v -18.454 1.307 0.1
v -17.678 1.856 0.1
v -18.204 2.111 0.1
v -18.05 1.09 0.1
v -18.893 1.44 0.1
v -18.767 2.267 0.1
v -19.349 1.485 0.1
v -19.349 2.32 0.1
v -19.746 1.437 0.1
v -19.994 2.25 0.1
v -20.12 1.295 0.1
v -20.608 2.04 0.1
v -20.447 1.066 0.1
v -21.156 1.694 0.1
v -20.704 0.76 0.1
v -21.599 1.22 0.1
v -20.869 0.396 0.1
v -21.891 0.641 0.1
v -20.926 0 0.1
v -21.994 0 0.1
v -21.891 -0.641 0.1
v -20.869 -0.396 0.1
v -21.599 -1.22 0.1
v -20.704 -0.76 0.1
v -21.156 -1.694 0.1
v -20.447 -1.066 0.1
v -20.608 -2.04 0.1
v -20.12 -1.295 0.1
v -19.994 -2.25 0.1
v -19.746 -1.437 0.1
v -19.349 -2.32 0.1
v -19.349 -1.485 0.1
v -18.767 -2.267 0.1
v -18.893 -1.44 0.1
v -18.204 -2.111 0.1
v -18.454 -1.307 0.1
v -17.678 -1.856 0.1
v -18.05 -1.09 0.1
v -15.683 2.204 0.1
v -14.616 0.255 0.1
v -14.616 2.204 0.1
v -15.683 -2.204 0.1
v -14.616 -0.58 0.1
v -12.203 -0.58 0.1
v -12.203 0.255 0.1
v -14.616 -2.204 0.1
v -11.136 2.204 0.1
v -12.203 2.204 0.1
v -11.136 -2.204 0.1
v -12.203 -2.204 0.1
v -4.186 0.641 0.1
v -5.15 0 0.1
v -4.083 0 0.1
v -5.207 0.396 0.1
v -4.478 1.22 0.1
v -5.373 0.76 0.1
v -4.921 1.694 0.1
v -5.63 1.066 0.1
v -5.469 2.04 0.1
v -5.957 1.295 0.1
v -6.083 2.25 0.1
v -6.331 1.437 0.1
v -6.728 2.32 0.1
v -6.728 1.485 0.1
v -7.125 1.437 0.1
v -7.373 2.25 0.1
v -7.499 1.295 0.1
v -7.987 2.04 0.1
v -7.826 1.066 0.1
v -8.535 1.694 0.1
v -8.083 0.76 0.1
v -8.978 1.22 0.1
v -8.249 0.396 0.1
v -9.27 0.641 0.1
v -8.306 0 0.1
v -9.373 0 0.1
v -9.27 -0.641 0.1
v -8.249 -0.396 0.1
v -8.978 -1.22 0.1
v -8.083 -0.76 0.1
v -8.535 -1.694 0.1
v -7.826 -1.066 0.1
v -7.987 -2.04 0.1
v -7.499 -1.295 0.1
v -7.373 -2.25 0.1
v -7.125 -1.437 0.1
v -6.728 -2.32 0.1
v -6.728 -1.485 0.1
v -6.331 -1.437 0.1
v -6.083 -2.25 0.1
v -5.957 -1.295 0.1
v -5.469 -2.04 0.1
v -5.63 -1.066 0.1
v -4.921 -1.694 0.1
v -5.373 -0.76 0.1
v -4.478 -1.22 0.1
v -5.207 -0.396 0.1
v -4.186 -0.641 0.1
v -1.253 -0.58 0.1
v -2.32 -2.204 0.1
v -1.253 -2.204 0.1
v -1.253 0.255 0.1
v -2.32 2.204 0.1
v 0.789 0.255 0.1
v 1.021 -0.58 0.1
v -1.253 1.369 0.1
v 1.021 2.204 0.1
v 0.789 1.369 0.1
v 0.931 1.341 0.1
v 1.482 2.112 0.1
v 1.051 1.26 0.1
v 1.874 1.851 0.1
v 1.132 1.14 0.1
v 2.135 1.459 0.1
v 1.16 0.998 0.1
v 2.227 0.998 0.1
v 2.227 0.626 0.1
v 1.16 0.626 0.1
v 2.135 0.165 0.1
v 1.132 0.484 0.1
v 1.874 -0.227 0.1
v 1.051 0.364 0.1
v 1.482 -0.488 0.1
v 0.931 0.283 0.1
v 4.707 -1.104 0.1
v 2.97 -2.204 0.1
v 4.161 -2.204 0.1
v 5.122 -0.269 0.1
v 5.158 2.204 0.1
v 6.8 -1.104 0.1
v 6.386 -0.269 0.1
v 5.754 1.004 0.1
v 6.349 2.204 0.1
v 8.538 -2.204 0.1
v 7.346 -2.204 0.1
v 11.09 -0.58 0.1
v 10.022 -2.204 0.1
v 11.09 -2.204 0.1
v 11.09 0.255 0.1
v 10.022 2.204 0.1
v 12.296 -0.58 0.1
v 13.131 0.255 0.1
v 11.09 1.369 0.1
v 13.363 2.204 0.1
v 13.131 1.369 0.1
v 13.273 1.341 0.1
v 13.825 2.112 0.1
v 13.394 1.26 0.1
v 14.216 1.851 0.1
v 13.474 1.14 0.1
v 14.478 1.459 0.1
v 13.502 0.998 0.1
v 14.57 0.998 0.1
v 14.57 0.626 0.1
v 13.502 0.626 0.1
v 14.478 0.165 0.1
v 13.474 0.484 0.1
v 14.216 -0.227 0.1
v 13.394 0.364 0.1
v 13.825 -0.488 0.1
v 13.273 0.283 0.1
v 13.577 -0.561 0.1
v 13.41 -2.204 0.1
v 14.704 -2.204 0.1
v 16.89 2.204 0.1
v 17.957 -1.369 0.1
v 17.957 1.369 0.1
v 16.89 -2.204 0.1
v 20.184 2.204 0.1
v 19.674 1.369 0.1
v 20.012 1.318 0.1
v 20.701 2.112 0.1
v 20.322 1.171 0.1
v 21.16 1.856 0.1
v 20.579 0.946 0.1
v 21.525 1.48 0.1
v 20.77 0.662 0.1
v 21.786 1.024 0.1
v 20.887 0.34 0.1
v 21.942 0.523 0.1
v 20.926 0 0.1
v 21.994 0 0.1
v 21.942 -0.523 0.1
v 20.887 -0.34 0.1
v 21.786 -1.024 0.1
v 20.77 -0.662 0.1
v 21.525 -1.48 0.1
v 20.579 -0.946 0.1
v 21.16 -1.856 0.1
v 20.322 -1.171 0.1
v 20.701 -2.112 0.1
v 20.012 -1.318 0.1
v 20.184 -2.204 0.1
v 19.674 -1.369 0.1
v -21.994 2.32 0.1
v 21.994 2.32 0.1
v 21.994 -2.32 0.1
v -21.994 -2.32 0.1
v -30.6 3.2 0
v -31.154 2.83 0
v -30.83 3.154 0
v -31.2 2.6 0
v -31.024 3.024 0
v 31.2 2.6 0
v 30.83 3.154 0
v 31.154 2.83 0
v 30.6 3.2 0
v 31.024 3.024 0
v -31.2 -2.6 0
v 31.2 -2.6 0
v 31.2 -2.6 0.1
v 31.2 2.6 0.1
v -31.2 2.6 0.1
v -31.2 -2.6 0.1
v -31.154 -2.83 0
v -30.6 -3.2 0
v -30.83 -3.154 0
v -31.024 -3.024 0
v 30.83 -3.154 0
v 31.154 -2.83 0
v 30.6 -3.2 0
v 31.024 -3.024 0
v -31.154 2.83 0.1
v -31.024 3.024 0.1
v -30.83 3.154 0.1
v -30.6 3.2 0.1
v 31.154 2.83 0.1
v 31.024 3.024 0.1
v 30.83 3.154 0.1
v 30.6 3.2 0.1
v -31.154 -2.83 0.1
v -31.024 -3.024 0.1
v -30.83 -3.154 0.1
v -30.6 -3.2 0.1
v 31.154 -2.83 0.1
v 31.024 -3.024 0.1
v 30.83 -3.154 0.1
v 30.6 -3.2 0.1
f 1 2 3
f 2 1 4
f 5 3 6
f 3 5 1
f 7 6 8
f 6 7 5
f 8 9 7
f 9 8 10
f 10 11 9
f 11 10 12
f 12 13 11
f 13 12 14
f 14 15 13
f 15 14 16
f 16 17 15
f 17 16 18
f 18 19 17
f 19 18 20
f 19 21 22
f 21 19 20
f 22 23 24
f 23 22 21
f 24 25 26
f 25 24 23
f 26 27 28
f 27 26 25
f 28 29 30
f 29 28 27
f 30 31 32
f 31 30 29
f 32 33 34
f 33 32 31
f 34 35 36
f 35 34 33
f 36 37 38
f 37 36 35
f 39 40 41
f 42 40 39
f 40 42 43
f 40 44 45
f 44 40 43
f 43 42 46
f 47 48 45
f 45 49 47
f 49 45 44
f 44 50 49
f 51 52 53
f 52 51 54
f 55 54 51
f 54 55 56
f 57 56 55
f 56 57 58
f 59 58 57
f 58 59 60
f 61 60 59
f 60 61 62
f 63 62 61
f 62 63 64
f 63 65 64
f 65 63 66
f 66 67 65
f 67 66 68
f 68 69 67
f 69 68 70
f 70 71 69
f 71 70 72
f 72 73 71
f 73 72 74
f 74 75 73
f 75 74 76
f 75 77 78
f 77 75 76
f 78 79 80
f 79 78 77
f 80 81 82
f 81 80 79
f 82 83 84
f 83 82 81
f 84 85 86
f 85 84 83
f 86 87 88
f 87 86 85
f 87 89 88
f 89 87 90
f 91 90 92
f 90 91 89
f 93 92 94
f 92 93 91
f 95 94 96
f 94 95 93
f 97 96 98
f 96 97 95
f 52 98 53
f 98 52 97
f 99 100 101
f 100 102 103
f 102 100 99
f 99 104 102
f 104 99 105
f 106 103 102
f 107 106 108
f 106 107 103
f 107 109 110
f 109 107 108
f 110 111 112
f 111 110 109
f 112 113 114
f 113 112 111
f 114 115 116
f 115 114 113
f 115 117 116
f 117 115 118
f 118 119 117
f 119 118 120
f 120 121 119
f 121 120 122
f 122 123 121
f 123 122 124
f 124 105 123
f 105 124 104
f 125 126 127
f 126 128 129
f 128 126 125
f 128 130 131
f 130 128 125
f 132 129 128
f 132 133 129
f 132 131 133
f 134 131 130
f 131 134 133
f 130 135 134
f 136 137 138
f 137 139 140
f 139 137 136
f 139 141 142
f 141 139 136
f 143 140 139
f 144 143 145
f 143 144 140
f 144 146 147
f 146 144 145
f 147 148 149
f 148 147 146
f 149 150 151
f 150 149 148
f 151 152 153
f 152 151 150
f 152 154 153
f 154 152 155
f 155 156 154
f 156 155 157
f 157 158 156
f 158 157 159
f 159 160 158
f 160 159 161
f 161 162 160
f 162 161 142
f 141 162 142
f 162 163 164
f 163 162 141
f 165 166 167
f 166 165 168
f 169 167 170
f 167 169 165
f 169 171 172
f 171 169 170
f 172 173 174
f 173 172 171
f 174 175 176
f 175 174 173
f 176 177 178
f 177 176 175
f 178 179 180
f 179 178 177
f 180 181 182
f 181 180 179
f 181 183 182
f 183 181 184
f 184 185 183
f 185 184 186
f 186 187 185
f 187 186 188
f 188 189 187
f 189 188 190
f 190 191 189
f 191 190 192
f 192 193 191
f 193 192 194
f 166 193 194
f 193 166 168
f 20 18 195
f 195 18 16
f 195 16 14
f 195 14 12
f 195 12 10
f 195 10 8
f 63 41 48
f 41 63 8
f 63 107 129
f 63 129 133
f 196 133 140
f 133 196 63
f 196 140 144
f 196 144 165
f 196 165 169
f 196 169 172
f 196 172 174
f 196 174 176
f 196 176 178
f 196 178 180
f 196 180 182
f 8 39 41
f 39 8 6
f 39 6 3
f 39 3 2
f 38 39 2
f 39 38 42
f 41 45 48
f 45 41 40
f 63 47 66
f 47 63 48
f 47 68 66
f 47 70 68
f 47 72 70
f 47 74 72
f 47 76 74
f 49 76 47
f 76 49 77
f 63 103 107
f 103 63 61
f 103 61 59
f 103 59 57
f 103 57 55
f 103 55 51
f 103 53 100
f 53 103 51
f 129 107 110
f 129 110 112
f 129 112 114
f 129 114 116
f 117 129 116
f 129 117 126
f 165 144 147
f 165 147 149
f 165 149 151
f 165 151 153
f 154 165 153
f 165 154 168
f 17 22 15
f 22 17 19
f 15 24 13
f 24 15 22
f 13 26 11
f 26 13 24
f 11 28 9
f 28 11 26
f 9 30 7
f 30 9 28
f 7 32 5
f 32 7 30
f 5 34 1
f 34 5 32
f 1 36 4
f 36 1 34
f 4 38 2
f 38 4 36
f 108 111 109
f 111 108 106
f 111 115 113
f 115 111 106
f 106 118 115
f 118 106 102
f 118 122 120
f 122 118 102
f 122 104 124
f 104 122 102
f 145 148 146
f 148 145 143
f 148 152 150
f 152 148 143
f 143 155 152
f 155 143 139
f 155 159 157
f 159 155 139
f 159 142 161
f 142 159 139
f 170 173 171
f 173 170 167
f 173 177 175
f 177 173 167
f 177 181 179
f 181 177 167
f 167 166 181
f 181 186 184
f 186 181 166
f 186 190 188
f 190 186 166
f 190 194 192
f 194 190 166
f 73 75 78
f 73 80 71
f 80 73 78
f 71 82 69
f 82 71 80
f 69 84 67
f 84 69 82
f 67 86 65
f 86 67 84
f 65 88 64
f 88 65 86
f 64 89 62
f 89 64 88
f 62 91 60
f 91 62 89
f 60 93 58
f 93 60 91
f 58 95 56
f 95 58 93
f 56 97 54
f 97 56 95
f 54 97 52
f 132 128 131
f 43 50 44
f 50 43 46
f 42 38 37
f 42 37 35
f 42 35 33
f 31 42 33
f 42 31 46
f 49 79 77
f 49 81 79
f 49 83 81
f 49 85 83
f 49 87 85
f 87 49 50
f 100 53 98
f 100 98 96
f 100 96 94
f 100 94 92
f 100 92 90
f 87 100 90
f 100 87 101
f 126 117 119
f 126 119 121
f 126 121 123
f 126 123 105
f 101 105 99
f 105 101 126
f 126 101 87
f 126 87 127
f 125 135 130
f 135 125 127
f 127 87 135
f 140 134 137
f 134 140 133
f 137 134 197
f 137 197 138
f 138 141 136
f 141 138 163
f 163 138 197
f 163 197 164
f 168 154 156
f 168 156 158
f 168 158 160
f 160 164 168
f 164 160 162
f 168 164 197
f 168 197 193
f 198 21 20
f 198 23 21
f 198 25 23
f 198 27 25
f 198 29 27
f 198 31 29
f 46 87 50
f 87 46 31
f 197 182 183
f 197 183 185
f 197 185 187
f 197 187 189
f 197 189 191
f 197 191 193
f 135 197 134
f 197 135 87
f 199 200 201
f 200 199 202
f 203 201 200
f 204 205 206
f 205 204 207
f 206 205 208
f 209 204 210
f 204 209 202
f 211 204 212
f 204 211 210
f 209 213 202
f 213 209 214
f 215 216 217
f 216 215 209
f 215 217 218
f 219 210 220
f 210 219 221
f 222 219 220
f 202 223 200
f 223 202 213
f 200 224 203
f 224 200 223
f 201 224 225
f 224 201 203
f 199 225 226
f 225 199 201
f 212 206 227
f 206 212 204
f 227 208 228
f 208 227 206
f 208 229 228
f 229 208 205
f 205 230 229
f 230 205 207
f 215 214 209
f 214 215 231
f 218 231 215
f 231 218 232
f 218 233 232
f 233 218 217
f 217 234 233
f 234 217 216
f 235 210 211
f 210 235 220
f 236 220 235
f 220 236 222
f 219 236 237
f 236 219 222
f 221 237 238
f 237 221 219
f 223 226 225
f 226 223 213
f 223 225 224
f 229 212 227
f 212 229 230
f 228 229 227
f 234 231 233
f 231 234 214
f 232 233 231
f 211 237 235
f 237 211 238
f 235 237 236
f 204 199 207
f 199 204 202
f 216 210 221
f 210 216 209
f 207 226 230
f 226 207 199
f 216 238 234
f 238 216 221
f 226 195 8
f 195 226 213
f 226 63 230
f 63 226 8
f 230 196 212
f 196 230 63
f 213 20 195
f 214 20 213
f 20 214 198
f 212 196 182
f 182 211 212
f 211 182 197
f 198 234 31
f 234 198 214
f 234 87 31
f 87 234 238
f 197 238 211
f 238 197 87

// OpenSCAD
// file: ../p/box3u12.scad
use <../lib.scad>
function ldraw_lib__box3u12() = [
// 0 Box with 3 Parallel Faces without Any Edges
// 0 Name: box3u12.dat
// 0 Author: J.C. Tchang [tchang]
// 0 !LDRAW_ORG Primitive UPDATE 2014-02
// 0 !LICENSE Licensed under CC BY 4.0 : see CAreadme.txt
// 
// 0 BFC CERTIFY CCW
  [0,"BFC","CERTIFY"],
  [0,"BFC","CCW"],
// 
// 0 !HISTORY 2014-12-23 [PTadmin] Official Update 2014-02
// 
// 
// 4 16 -1 1 1 1 1 1 1 1 -1 -1 1 -1
  [4,16,-1,1,1,1,1,1,1,1,-1,-1,1,-1],
// 4 16 -1 1 1 -1 0 1 1 0 1 1 1 1
  [4,16,-1,1,1,-1,0,1,1,0,1,1,1,1],
// 4 16 1 1 -1 1 0 -1 -1 0 -1 -1 1 -1
  [4,16,1,1,-1,1,0,-1,-1,0,-1,-1,1,-1],
];
module ldraw_lib__box3u12(step=0, col=false, unit=2/5, alt=false, line=0.2, solid=!$preview)
    makepoly(ldraw_lib__box3u12(), step=step, col=col, unit=unit, alt=alt, line=line, solid=solid);
ldraw_lib__box3u12(line=0.2);
// file: ../p/1-4cyli.scad
use <../lib.scad>
function ldraw_lib__1_4cyli() = [
// 0 Cylinder 0.25
// 0 Name: 1-4cyli.dat
// 0 Author: James Jessiman
// 0 !LDRAW_ORG Primitive UPDATE 2012-01
// 0 !LICENSE Licensed under CC BY 4.0 : see CAreadme.txt
// 
// 0 BFC CERTIFY CCW
  [0,"BFC","CERTIFY"],
  [0,"BFC","CCW"],
// 
// 0 !HISTORY 2002-03-23 [sbliss] Added BFC statement.
// 0 !HISTORY 2002-04-25 [PTadmin] Official Update 2002-02
// 0 !HISTORY 2007-06-22 [PTadmin] Header formatted for Contributor Agreement
// 0 !HISTORY 2008-07-01 [PTadmin] Official Update 2008-01
// 0 !HISTORY 2012-02-16 [Philo] Changed to CCW
// 0 !HISTORY 2012-03-30 [PTadmin] Official Update 2012-01
// 
// 
// 4 16 1 1 0 0.9239 1 0.3827 0.9239 0 0.3827 1 0 0
  [4,16,1,1,0,0.9239,1,0.3827,0.9239,0,0.3827,1,0,0],
// 5 24 1 0 0 1 1 0 0.9239 0 0.3827 1 0 -1
  [5,24,1,0,0,1,1,0,0.9239,0,0.3827,1,0,-1],
// 4 16 0.9239 1 0.3827 0.7071 1 0.7071 0.7071 0 0.7071 0.9239 0 0.3827
  [4,16,0.9239,1,0.3827,0.7071,1,0.7071,0.7071,0,0.7071,0.9239,0,0.3827],
// 5 24 0.9239 0 0.3827 0.9239 1 0.3827 0.7071 0 0.7071 1 0 0
  [5,24,0.9239,0,0.3827,0.9239,1,0.3827,0.7071,0,0.7071,1,0,0],
// 4 16 0.7071 1 0.7071 0.3827 1 0.9239 0.3827 0 0.9239 0.7071 0 0.7071
  [4,16,0.7071,1,0.7071,0.3827,1,0.9239,0.3827,0,0.9239,0.7071,0,0.7071],
// 5 24 0.7071 0 0.7071 0.7071 1 0.7071 0.3827 0 0.9239 0.9239 0 0.3827
  [5,24,0.7071,0,0.7071,0.7071,1,0.7071,0.3827,0,0.9239,0.9239,0,0.3827],
// 4 16 0.3827 1 0.9239 0 1 1 0 0 1 0.3827 0 0.9239
  [4,16,0.3827,1,0.9239,0,1,1,0,0,1,0.3827,0,0.9239],
// 5 24 0.3827 0 0.9239 0.3827 1 0.9239 0 0 1 0.7071 0 0.7071
  [5,24,0.3827,0,0.9239,0.3827,1,0.9239,0,0,1,0.7071,0,0.7071],
// 5 24 0 0 1 0 1 1 0.3827 0 0.9239 -1 0 1
  [5,24,0,0,1,0,1,1,0.3827,0,0.9239,-1,0,1],
];
module ldraw_lib__1_4cyli(step=0, col=false, unit=2/5, alt=false, line=0.2, solid=!$preview)
    makepoly(ldraw_lib__1_4cyli(), step=step, col=col, unit=unit, alt=alt, line=line, solid=solid);
ldraw_lib__1_4cyli(line=0.2);
// file: ../p/1-4chrd.scad
use <../lib.scad>
function ldraw_lib__1_4chrd() = [
// 0 Chord 0.25
// 0 Name: 1-4chrd.dat
// 0 Author: Max Martin Richter [MMR1988]
// 0 !LDRAW_ORG Primitive UPDATE 2023-05
// 0 !LICENSE Licensed under CC BY 4.0 : see CAreadme.txt
// 
// 0 BFC CERTIFY CCW
  [0,"BFC","CERTIFY"],
  [0,"BFC","CCW"],
// 
// 0 !HISTORY 2004-04-22 [PTadmin] Official Update 2004-02
// 0 !HISTORY 2007-10-09 [PTadmin] Header formatted for Contributor Agreement
// 0 !HISTORY 2008-07-01 [PTadmin] Official Update 2008-01
// 0 !HISTORY 2012-08-02 [MMR1988] Re-creation with PrimGen2 and Rectifier
// 0 !HISTORY 2012-08-09 [PTadmin] Official Update 2012-02
// 0 !HISTORY 2023-10-27 [OrionP] Change author to MMR1988 from hafhead
// 0 !HISTORY 2023-10-31 [OrionP] Official Update 2023-05
// 
// 4 16 0.9239 0 0.3827 0.3827 0 0.9239 0 0 1 1 0 0
  [4,16,0.9239,0,0.3827,0.3827,0,0.9239,0,0,1,1,0,0],
// 3 16 0.7071 0 0.7071 0.3827 0 0.9239 0.9239 0 0.3827
  [3,16,0.7071,0,0.7071,0.3827,0,0.9239,0.9239,0,0.3827],
];
module ldraw_lib__1_4chrd(step=0, col=false, unit=2/5, alt=false, line=0.2, solid=!$preview)
    makepoly(ldraw_lib__1_4chrd(), step=step, col=col, unit=unit, alt=alt, line=line, solid=solid);
ldraw_lib__1_4chrd(line=0.2);
// main file
use <../lib.scad>
use <../p/1-4chrd.scad>
use <../p/1-4cyli.scad>
use <../p/box3u12.scad>
use <../p/logo-chopard-box.scad>
use <../p/logo-chopard-text.scad>
function ldraw_lib__6148328j() = [
// 0 Sticker  0.8 x  7.8 with White Chopard Logo on Dark Grey Background
// 0 Name: 6148328j.dat
// 0 Author: Massimo Maso [Sirio]
// 0 !LDRAW_ORG Part UPDATE 2024-08
// 0 !LICENSE Licensed under CC BY 4.0 : see CAreadme.txt
// 
// 0 BFC CERTIFY CCW
  [0,"BFC","CERTIFY"],
  [0,"BFC","CCW"],
// 
// 0 !KEYWORDS 917K, 919, Bricklink 75876stk01, Brickowl 852010, Hybrid, Pit Lane
// 0 !KEYWORDS Porsche, Rebrickable 26357, set 75876, Speed Champions
// 
// 0 !HISTORY 2024-09-30 [OrionP] Official Update 2024-08
// 
// 0 // Logo primitive
// 1 15 0 -.25 0 1.16 0 0 0 1 0 0 0 1.16 logo-chopard-text.dat
  [1,15,0,-.25,0,1.16,0,0,0,1,0,0,0,1.16, ldraw_lib__logo_chopard_text()],
// 1 72 0 -.25 0 1.16 0 0 0 1 0 0 0 1.16 logo-chopard-box.dat
  [1,72,0,-.25,0,1.16,0,0,0,1,0,0,0,1.16, ldraw_lib__logo_chopard_box()],
// 0 // Primitives
// 1 16 -76.5 0 6.5 -1.5 0 0 0 -1 0 0 0 1.5 1-4chrd.dat
  [1,16,-76.5,0,6.5,-1.5,0,0,0,-1,0,0,0,1.5, ldraw_lib__1_4chrd()],
// 1 16 76.5 0 6.5 1.5 0 0 0 -1 0 0 0 1.5 1-4chrd.dat
  [1,16,76.5,0,6.5,1.5,0,0,0,-1,0,0,0,1.5, ldraw_lib__1_4chrd()],
// 1 16 0 -.25 0 0 0 78 0 .25 0 6.5 0 0 box3u12.dat
  [1,16,0,-.25,0,0,0,78,0,.25,0,6.5,0,0, ldraw_lib__box3u12()],
// 1 16 -76.5 0 -6.5 -1.5 0 0 0 -1 0 0 0 -1.5 1-4chrd.dat
  [1,16,-76.5,0,-6.5,-1.5,0,0,0,-1,0,0,0,-1.5, ldraw_lib__1_4chrd()],
// 1 16 76.5 0 -6.5 1.5 0 0 0 -1 0 0 0 -1.5 1-4chrd.dat
  [1,16,76.5,0,-6.5,1.5,0,0,0,-1,0,0,0,-1.5, ldraw_lib__1_4chrd()],
// 1 16 -76.5 0 6.5 -1.5 0 0 0 -.25 0 0 0 1.5 1-4cyli.dat
  [1,16,-76.5,0,6.5,-1.5,0,0,0,-.25,0,0,0,1.5, ldraw_lib__1_4cyli()],
// 1 16 76.5 0 6.5 1.5 0 0 0 -.25 0 0 0 1.5 1-4cyli.dat
  [1,16,76.5,0,6.5,1.5,0,0,0,-.25,0,0,0,1.5, ldraw_lib__1_4cyli()],
// 1 16 -76.5 0 -6.5 -1.5 0 0 0 -.25 0 0 0 -1.5 1-4cyli.dat
  [1,16,-76.5,0,-6.5,-1.5,0,0,0,-.25,0,0,0,-1.5, ldraw_lib__1_4cyli()],
// 1 16 76.5 0 -6.5 1.5 0 0 0 -.25 0 0 0 -1.5 1-4cyli.dat
  [1,16,76.5,0,-6.5,1.5,0,0,0,-.25,0,0,0,-1.5, ldraw_lib__1_4cyli()],
// 1 72 -76.5 -.25 6.5 -1.5 0 0 0 1 0 0 0 1.5 1-4chrd.dat
  [1,72,-76.5,-.25,6.5,-1.5,0,0,0,1,0,0,0,1.5, ldraw_lib__1_4chrd()],
// 1 72 76.5 -.25 6.5 1.5 0 0 0 1 0 0 0 1.5 1-4chrd.dat
  [1,72,76.5,-.25,6.5,1.5,0,0,0,1,0,0,0,1.5, ldraw_lib__1_4chrd()],
// 1 72 -76.5 -.25 -6.5 -1.5 0 0 0 1 0 0 0 -1.5 1-4chrd.dat
  [1,72,-76.5,-.25,-6.5,-1.5,0,0,0,1,0,0,0,-1.5, ldraw_lib__1_4chrd()],
// 1 72 76.5 -.25 -6.5 1.5 0 0 0 1 0 0 0 -1.5 1-4chrd.dat
  [1,72,76.5,-.25,-6.5,1.5,0,0,0,1,0,0,0,-1.5, ldraw_lib__1_4chrd()],
// 0 // Bottom faces
// 4 16 76.5 0 8 78 0 6.5 -78 0 6.5 -76.5 0 8
  [4,16,76.5,0,8,78,0,6.5,-78,0,6.5,-76.5,0,8],
// 4 16 76.5 0 -8 -76.5 0 -8 -78 0 -6.5 78 0 -6.5
  [4,16,76.5,0,-8,-76.5,0,-8,-78,0,-6.5,78,0,-6.5],
// 0 // Lateral faces
// 4 16 -76.5 0 8 -76.5 -.25 8 76.5 -.25 8 76.5 0 8
  [4,16,-76.5,0,8,-76.5,-.25,8,76.5,-.25,8,76.5,0,8],
// 4 16 -76.5 0 -8 76.5 0 -8 76.5 -.25 -8 -76.5 -.25 -8
  [4,16,-76.5,0,-8,76.5,0,-8,76.5,-.25,-8,-76.5,-.25,-8],
// 0 // Top faces
// 4 72 -76.5 -.25 8 -78 -.25 6.5 -54.984 -.25 5.8 -48.372 -.25 5.8
  [4,72,-76.5,-.25,8,-78,-.25,6.5,-54.984,-.25,5.8,-48.372,-.25,5.8],
// 4 72 -76.5 -.25 8 -48.372 -.25 5.8 -16.82 -.25 5.8 76.5 -.25 8
  [4,72,-76.5,-.25,8,-48.372,-.25,5.8,-16.82,-.25,5.8,76.5,-.25,8],
// 4 72 76.5 -.25 8 -16.82 -.25 5.8 54.984 -.25 5.8 78 -.25 6.5
  [4,72,76.5,-.25,8,-16.82,-.25,5.8,54.984,-.25,5.8,78,-.25,6.5],
// 3 72 -78 -.25 6.5 -54.984 -.25 0 -54.984 -.25 5.8
  [3,72,-78,-.25,6.5,-54.984,-.25,0,-54.984,-.25,5.8],
// 4 72 -78 -.25 6.5 -78 -.25 -6.5 -54.984 -.25 -5.8 -54.984 -.25 0
  [4,72,-78,-.25,6.5,-78,-.25,-6.5,-54.984,-.25,-5.8,-54.984,-.25,0],
// 3 72 78 -.25 6.5 54.984 -.25 5.8 54.984 -.25 0
  [3,72,78,-.25,6.5,54.984,-.25,5.8,54.984,-.25,0],
// 4 72 78 -.25 6.5 54.984 -.25 0 54.984 -.25 -5.8 78 -.25 -6.5
  [4,72,78,-.25,6.5,54.984,-.25,0,54.984,-.25,-5.8,78,-.25,-6.5],
// 4 72 -76.5 -.25 -8 -48.372 -.25 -5.8 -54.984 -.25 -5.8 -78 -.25 -6.5
  [4,72,-76.5,-.25,-8,-48.372,-.25,-5.8,-54.984,-.25,-5.8,-78,-.25,-6.5],
// 4 72 -76.5 -.25 -8 76.5 -.25 -8 -16.82 -.25 -5.8 -48.372 -.25 -5.8
  [4,72,-76.5,-.25,-8,76.5,-.25,-8,-16.82,-.25,-5.8,-48.372,-.25,-5.8],
// 4 72 76.5 -.25 -8 78 -.25 -6.5 54.984 -.25 -5.8 -16.82 -.25 -5.8
  [4,72,76.5,-.25,-8,78,-.25,-6.5,54.984,-.25,-5.8,-16.82,-.25,-5.8],
];
module ldraw_lib__6148328j(step=0, col=false, unit=2/5, alt=false, line=0.2, solid=!$preview)
    makepoly(ldraw_lib__6148328j(), step=step, col=col, unit=unit, alt=alt, line=line, solid=solid);
ldraw_lib__6148328j(line=0.2);
